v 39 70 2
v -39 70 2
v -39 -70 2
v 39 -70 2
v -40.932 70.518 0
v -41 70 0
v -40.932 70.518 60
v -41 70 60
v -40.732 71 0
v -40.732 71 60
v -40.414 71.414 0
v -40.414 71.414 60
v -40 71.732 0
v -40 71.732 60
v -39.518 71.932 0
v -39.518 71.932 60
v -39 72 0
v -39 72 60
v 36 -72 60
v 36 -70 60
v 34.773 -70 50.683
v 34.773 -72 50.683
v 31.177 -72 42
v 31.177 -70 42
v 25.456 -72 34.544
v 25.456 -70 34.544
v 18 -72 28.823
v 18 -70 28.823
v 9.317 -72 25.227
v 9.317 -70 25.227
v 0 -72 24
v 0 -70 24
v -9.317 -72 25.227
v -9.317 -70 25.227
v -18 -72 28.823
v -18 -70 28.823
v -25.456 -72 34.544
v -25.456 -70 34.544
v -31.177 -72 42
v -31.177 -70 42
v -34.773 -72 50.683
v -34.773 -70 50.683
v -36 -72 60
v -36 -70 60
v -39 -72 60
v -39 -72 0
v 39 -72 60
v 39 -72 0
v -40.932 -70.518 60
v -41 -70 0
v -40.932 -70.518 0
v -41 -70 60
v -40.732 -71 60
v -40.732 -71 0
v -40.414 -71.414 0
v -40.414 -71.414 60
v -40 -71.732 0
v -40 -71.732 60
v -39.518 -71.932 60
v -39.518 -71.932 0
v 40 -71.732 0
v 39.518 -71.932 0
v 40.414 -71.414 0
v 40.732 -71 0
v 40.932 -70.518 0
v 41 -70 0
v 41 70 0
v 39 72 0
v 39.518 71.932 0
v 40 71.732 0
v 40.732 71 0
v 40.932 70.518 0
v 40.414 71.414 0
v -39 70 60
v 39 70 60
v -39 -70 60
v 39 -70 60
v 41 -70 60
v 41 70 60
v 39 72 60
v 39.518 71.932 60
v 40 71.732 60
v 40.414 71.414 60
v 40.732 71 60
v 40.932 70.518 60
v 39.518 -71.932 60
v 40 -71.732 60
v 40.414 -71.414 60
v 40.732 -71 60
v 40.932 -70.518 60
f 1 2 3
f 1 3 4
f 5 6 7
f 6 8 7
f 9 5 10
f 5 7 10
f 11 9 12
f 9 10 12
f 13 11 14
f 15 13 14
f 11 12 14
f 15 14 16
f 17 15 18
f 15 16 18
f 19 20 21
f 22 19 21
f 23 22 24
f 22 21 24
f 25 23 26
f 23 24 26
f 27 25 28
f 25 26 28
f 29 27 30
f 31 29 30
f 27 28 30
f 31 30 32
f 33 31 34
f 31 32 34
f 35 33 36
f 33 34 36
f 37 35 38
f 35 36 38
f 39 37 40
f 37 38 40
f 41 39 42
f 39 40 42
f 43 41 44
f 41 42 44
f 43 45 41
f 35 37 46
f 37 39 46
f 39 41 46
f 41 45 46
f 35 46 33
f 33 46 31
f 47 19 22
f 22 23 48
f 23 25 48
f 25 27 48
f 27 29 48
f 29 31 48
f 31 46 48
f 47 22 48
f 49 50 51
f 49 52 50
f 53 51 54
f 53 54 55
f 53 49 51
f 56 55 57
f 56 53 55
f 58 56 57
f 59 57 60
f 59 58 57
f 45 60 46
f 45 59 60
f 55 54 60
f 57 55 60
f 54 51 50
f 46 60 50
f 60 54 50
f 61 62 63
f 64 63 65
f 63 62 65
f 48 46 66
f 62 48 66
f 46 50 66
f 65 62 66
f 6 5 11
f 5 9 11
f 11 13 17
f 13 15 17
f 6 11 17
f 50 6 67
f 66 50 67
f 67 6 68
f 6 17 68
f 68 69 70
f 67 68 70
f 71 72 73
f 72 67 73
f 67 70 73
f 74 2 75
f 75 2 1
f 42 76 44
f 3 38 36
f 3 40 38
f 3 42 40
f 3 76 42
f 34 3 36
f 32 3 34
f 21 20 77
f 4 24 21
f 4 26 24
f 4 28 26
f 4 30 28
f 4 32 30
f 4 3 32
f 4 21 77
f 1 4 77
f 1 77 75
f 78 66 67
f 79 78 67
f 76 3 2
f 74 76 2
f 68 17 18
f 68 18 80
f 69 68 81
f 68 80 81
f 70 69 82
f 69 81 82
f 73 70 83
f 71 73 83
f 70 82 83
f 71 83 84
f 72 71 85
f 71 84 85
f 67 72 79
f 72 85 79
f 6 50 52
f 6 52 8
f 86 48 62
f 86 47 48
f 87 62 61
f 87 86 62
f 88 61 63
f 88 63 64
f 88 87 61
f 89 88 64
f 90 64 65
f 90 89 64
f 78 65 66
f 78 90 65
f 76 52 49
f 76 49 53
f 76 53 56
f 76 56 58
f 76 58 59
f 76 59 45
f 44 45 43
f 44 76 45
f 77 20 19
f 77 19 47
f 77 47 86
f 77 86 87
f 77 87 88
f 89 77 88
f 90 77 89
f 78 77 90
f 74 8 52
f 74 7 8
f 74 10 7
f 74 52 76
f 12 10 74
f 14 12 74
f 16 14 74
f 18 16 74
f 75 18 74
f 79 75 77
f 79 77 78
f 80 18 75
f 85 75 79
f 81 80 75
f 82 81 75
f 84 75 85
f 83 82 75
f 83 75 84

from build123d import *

# Parameters (mm, degrees)
F0_W     = 78
F0_H     = 140
F1_DEPTH = 2
F0_W_2   = 82
F0_H_2   = 144
F2_DEPTH = 60
F4_DEPTH = 25
F5_R     = 2


# Not quite as in the source:
# - a feature names something its author has since deleted; it is built from what else it names


with BuildPart() as f1:
    # F0 (on Top) → F1 (new body)
    with BuildSketch(Plane.XY):
        Rectangle(F0_W, F0_H)
    extrude(amount=F1_DEPTH)

    # F0 (on Top) → F2 (join)
    with BuildSketch(Plane.XY):
        Rectangle(F0_W_2, F0_H_2)
        Rectangle(F0_W, F0_H, mode=Mode.SUBTRACT)
    extrude(amount=F2_DEPTH)

    # F3 (on face) → F4 (cut)
    with BuildSketch(Plane(origin=(0, -70, 0), x_dir=(-1, 0, 0), z_dir=(0, 1, 0))):
        with BuildLine():
            Line((36, 60), (-36, 60))
            ThreePointArc((-36, 60), (0, 24), (36, 60))
        make_face()
    extrude(amount=-F4_DEPTH, mode=Mode.SUBTRACT)

    # F5
    f5_edges = [f1.edges().sort_by_distance(p)[0] for p in [
        (-41, 72, 30),
        (41, 72, 30),
        (-41, -72, 30),
        (41, -72, 30),
    ]]
    fillet(f5_edges, radius=F5_R)


solid = f1.part
